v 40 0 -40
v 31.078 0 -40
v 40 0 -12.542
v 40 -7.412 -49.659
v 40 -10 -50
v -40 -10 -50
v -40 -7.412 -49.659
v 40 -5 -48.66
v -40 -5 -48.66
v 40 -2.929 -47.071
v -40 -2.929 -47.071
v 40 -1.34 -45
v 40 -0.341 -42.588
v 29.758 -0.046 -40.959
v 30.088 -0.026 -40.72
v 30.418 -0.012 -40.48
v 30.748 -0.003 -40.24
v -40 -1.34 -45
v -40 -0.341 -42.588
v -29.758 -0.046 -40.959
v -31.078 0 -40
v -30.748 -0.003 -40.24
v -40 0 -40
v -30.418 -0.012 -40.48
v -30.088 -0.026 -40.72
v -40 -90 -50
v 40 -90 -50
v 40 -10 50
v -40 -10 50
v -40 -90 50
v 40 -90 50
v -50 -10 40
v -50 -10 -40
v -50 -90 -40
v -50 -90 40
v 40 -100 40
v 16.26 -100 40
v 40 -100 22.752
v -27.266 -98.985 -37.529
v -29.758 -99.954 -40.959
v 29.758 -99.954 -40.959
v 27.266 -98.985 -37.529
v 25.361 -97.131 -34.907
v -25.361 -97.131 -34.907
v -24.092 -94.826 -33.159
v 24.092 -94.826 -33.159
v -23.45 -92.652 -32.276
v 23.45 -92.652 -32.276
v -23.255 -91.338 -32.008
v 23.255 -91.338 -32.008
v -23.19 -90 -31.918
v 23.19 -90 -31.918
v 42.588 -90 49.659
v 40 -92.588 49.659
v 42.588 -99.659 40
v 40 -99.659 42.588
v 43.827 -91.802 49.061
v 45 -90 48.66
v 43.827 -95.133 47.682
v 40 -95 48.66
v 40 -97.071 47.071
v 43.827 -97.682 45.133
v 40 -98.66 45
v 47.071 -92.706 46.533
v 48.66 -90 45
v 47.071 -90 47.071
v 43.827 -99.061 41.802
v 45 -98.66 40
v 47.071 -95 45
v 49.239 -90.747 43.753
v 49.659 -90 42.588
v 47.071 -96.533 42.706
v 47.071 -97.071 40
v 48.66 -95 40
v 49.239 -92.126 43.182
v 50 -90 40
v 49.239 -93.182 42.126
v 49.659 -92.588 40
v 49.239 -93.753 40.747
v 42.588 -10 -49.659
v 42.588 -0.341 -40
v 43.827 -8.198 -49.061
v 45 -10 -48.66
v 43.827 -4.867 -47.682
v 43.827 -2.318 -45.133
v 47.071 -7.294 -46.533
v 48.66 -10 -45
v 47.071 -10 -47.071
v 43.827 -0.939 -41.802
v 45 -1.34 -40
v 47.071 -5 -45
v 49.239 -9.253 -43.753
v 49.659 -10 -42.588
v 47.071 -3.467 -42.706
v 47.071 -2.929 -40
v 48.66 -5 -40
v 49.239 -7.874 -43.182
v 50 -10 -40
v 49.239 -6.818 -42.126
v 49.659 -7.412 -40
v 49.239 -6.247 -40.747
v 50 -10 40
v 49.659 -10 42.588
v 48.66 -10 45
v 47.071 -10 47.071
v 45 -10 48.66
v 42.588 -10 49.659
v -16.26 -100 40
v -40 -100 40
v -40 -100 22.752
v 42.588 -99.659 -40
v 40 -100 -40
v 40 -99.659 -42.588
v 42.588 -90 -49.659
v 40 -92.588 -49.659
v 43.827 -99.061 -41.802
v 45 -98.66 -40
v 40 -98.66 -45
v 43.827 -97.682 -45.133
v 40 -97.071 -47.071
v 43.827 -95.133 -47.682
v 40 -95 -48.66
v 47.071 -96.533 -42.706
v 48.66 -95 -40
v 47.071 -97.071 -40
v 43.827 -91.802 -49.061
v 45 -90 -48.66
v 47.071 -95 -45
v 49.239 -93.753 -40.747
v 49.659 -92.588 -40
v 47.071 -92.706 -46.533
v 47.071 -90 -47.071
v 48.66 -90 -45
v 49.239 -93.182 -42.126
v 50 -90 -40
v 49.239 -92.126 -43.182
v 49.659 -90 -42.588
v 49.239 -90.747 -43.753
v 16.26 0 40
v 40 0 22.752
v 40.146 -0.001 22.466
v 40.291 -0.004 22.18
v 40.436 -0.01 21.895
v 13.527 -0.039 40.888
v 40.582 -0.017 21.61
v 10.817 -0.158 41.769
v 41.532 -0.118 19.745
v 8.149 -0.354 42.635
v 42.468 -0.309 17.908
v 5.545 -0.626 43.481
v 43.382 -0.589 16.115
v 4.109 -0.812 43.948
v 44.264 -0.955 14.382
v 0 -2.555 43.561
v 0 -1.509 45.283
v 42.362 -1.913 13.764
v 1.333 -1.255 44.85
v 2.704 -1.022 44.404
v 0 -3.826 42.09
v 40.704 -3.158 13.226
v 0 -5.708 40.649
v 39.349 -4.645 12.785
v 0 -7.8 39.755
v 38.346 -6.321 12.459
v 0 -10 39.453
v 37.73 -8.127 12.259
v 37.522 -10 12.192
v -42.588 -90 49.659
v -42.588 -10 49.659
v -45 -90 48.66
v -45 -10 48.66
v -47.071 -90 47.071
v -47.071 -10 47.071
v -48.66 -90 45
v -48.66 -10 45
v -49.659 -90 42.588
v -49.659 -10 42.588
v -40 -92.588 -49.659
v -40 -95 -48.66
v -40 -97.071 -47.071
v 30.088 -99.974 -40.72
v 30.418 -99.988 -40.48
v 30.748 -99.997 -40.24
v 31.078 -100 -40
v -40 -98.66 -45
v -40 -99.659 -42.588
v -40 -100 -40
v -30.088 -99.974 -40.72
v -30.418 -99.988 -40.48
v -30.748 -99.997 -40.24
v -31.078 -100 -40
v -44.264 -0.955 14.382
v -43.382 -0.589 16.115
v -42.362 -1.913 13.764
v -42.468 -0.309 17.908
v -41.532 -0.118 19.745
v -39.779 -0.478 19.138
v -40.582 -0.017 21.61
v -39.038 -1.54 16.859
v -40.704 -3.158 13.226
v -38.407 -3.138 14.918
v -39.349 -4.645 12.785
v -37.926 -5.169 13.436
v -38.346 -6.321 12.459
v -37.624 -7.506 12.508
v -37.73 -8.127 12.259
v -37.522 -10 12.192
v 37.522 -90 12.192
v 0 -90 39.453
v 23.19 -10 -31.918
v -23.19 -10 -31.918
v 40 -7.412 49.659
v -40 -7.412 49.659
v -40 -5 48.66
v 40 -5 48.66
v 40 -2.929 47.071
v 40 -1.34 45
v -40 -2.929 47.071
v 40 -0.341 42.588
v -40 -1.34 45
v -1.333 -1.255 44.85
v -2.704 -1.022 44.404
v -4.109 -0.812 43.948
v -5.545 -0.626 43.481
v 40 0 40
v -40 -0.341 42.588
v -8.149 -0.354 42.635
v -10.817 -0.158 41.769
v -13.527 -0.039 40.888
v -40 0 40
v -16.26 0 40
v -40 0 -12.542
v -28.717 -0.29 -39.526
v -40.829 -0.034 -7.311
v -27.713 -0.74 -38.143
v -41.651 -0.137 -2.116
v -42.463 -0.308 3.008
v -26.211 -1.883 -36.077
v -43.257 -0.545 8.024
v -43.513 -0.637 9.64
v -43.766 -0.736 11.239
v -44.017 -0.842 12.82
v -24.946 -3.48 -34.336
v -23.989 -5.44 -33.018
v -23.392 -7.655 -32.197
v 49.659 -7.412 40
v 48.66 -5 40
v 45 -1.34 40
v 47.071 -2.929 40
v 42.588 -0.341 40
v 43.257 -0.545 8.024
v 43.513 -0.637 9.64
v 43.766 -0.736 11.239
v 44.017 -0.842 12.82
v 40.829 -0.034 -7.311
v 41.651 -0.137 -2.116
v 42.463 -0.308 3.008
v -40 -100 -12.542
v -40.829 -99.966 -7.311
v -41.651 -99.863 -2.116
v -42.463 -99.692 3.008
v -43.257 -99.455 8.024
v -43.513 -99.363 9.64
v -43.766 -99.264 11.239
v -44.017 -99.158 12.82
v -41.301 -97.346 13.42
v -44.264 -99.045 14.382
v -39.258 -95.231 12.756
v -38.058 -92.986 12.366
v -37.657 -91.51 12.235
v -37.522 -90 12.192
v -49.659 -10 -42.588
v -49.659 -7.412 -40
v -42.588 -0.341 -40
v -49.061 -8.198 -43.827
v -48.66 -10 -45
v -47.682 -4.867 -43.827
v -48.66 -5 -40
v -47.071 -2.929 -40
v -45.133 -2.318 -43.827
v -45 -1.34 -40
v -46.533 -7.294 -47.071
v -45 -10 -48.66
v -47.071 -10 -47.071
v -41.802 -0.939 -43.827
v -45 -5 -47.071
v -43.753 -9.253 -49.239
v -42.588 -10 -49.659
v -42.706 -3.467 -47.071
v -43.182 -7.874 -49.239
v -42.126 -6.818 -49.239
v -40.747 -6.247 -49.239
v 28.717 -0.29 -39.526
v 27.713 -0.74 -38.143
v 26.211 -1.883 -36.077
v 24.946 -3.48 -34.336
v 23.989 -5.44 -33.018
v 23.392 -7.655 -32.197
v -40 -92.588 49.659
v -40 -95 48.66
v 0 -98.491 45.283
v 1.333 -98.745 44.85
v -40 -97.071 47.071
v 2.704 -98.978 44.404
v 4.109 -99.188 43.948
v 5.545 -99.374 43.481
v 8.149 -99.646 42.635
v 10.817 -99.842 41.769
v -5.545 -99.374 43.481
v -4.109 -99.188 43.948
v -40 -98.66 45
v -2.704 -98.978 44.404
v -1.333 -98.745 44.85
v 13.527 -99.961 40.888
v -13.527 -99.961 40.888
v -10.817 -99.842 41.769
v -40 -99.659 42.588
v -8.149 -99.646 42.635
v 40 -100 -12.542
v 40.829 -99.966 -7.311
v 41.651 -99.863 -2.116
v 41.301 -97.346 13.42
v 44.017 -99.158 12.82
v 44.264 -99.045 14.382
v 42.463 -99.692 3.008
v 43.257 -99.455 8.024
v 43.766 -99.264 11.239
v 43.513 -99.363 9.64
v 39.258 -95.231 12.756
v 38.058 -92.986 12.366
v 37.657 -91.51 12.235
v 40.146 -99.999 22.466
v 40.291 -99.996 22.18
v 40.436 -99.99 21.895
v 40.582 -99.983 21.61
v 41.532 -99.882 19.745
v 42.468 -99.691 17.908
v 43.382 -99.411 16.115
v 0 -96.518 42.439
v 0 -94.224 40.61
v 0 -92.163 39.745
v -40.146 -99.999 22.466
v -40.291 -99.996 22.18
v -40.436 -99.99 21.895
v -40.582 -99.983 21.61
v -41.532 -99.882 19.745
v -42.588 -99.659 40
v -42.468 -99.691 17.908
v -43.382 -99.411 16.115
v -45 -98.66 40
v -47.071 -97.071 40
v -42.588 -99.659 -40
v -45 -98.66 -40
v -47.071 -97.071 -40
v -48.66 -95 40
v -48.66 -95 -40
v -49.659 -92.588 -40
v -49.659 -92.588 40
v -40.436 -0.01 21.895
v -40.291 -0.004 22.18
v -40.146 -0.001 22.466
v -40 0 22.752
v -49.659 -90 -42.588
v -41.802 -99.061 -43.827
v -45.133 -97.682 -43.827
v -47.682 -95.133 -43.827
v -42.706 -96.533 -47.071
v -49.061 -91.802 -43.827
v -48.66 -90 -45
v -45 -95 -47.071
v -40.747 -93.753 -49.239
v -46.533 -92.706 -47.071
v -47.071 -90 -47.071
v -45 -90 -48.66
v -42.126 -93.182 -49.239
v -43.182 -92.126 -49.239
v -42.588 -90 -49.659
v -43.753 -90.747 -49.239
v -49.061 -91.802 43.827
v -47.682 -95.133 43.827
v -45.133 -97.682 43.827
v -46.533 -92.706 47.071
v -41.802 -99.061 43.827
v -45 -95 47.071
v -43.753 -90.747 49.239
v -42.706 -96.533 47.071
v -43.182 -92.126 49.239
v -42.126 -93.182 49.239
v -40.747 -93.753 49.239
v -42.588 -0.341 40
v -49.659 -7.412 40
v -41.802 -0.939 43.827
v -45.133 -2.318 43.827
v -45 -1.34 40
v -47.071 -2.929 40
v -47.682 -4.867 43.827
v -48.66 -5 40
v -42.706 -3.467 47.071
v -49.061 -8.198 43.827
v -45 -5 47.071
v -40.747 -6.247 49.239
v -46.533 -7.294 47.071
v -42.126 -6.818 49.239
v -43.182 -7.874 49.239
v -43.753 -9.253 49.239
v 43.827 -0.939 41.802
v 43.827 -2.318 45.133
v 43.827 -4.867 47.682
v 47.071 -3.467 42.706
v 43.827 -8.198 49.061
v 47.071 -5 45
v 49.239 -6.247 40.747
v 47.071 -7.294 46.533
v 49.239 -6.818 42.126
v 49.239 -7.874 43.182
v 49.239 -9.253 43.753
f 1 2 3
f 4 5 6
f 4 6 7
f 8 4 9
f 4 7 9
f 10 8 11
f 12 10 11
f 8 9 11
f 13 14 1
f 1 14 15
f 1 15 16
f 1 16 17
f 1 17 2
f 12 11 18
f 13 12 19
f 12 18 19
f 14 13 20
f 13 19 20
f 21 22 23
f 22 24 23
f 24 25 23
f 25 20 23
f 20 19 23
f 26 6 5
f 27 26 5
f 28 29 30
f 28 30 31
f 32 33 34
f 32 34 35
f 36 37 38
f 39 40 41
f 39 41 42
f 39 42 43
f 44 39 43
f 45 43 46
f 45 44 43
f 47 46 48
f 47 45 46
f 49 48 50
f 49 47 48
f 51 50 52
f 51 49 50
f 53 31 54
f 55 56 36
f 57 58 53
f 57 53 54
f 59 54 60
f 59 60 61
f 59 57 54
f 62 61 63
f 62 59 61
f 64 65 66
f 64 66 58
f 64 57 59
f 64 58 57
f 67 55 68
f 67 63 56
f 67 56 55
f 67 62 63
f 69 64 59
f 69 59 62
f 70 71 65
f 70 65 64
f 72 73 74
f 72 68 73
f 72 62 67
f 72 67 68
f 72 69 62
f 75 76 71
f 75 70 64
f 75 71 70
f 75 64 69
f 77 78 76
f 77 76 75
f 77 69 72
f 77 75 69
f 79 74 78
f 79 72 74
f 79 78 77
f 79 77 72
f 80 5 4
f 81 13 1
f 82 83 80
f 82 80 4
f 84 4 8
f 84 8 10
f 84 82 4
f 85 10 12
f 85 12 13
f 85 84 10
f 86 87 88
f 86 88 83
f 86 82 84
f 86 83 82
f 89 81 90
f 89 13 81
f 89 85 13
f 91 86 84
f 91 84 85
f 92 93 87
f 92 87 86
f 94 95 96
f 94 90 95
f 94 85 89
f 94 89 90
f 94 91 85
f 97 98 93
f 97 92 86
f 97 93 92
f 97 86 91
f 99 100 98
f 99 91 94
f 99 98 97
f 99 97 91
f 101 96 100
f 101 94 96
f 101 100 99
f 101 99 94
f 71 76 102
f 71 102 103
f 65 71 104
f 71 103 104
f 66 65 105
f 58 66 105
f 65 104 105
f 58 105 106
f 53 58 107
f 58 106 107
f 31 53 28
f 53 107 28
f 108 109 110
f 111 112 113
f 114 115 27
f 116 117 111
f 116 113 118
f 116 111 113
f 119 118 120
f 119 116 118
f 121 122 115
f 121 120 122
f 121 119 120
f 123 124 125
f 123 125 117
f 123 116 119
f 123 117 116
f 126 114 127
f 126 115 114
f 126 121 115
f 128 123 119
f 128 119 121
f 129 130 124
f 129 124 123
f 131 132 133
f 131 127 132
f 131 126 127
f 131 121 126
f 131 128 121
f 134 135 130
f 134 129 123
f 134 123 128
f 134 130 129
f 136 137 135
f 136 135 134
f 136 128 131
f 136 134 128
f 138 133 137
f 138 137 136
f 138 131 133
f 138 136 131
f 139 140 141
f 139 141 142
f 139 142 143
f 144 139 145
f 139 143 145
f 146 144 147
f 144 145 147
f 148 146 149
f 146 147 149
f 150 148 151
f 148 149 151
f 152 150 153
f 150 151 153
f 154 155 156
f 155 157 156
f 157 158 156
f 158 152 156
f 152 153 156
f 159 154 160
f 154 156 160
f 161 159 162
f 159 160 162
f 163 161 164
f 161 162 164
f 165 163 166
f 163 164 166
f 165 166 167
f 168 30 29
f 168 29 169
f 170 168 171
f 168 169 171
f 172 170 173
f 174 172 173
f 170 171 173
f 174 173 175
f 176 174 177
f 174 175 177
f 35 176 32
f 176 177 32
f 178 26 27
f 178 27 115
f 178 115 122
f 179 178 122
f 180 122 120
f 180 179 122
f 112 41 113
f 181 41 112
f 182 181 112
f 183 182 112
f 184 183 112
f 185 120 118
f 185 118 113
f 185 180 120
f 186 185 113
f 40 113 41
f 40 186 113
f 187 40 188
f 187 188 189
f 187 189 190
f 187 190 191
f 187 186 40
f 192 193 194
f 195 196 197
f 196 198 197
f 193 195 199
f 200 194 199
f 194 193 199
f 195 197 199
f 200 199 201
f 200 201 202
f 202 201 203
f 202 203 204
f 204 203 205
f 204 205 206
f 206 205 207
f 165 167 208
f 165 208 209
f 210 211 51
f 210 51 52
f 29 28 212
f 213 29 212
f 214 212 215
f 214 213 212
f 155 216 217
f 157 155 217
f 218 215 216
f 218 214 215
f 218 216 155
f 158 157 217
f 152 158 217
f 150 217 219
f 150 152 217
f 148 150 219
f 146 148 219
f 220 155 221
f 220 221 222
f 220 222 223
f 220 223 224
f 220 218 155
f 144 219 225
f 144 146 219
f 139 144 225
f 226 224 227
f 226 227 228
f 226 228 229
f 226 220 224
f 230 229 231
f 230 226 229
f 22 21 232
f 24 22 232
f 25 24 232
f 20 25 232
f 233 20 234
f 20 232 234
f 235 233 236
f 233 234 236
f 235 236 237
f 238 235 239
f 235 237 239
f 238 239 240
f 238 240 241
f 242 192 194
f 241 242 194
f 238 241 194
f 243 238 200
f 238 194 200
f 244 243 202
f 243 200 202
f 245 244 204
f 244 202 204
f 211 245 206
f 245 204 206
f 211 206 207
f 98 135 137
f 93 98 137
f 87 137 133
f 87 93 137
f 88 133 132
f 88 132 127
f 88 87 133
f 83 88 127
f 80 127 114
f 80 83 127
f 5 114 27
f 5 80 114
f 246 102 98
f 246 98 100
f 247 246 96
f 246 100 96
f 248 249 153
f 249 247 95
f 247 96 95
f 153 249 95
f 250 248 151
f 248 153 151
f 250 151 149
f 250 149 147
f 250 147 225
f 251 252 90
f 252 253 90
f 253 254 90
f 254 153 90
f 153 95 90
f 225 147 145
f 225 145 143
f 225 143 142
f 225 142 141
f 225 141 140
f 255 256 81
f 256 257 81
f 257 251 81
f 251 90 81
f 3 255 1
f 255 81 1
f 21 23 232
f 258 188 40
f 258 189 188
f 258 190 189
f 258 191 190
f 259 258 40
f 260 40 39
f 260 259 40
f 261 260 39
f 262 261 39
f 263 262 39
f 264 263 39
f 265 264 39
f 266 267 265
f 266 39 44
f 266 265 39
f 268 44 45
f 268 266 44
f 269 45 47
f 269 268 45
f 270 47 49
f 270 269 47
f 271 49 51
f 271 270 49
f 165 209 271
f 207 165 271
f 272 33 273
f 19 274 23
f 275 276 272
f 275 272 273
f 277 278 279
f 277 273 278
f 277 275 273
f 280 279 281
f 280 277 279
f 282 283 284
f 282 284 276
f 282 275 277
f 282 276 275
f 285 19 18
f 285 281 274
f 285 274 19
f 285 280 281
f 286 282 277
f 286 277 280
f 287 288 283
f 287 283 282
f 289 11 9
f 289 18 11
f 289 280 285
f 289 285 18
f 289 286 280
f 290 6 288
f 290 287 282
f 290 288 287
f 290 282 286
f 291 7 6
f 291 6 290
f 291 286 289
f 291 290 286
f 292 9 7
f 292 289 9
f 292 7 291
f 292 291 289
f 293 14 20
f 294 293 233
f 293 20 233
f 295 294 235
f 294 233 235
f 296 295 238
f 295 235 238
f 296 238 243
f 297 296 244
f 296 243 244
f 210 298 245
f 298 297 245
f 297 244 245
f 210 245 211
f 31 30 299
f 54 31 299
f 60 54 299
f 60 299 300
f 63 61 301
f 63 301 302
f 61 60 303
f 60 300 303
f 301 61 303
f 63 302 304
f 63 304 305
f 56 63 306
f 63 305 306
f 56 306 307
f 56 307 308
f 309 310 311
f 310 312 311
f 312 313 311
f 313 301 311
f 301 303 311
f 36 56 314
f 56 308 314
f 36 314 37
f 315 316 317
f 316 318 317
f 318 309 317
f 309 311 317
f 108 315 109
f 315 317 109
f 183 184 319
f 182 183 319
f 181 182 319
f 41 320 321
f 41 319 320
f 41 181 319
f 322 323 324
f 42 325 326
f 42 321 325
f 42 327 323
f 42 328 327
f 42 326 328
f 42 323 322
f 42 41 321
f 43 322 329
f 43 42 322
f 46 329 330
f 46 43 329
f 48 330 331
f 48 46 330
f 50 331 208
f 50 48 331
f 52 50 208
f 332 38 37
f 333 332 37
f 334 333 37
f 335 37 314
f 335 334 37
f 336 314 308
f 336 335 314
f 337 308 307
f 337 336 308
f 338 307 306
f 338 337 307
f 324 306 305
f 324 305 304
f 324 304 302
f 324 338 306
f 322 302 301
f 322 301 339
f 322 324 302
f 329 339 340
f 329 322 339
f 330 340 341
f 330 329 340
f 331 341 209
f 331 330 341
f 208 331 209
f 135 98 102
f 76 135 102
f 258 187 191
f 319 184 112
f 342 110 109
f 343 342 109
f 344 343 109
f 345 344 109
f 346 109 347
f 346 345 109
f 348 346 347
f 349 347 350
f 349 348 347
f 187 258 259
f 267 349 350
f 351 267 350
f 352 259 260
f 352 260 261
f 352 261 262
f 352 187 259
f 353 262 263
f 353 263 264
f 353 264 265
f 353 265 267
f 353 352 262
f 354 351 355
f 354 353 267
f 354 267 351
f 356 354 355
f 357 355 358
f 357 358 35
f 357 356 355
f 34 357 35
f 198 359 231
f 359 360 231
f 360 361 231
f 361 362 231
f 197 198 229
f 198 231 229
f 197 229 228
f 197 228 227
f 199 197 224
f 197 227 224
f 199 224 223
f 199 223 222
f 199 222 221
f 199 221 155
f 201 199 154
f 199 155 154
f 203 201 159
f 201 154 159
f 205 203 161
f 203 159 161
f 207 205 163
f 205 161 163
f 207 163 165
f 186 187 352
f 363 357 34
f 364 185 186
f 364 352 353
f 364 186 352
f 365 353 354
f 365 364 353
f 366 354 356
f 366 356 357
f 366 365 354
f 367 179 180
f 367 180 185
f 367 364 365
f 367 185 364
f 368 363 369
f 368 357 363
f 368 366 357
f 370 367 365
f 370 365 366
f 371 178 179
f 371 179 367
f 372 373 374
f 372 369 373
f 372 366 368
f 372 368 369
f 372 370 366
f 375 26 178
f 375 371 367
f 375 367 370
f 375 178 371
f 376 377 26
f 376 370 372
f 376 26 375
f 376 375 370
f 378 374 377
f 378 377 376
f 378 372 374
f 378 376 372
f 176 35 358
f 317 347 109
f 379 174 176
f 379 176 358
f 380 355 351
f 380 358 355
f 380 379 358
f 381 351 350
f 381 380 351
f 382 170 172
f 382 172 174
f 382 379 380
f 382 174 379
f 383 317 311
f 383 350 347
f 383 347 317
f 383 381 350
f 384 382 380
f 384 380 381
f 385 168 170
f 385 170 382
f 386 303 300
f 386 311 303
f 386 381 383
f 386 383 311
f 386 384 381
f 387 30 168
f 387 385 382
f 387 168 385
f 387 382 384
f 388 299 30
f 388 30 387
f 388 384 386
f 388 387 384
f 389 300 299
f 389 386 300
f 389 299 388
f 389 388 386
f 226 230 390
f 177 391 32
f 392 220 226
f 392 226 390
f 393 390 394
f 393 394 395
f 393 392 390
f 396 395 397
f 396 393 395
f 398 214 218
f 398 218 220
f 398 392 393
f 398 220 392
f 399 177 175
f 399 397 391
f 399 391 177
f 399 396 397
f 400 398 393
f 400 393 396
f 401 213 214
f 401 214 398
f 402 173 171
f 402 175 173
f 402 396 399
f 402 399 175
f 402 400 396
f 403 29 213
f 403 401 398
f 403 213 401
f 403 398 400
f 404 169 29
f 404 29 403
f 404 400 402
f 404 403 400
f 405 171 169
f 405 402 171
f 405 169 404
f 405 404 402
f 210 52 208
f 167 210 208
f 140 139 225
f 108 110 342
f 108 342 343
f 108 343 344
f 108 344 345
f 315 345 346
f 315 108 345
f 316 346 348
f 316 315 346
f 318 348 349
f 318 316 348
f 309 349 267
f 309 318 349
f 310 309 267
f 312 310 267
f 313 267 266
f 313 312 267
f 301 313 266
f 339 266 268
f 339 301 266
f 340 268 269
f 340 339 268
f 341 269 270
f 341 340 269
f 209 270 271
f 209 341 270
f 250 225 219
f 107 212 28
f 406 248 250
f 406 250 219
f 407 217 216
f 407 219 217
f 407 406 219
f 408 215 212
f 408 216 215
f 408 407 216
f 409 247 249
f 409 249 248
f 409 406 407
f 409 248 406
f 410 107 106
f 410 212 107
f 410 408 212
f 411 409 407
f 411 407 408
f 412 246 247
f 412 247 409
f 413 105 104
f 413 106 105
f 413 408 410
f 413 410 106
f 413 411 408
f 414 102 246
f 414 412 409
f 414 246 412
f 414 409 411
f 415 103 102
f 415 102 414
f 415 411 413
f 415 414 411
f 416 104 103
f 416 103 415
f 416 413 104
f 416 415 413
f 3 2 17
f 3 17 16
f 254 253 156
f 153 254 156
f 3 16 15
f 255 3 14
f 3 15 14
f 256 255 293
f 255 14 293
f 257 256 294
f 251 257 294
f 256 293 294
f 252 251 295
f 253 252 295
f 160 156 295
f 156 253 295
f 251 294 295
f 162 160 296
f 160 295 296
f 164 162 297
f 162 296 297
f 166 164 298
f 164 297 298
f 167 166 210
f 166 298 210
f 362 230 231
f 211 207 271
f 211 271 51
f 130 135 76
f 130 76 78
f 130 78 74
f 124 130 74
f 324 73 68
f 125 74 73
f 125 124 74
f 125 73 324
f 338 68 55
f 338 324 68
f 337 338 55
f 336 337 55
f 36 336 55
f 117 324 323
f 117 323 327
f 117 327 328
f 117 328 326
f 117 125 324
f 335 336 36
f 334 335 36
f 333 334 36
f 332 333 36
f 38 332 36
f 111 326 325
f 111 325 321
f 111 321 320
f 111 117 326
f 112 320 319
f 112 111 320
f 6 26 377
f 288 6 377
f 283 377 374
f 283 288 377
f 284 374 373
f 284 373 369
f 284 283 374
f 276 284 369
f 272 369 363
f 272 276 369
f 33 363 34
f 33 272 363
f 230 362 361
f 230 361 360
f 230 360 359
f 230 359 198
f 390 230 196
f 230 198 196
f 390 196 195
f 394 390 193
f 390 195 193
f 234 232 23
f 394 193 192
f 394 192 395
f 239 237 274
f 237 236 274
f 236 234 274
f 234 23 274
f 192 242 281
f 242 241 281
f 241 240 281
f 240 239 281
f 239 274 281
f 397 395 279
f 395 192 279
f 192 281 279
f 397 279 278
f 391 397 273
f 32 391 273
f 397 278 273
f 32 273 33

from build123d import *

# Parameters (mm, degrees)
F0_W          = 100
F0_H          = 100
F1_DEPTH      = 100
F3_DEPTH      = 134.3
F4_T1_DEPTH   = 80
F4_T3_DEPTH   = 80
F4_T5_DEPTH   = 80
F4_S9_W       = 10
F4_S9_H       = 10
F4_T10_DEPTH  = 10
F4_S15_W      = 10
F4_S15_H      = 10
F4_T16_DEPTH  = 10
F4_S21_W      = 10
F4_S21_H      = 10
F4_T22_DEPTH  = 10
F4_S27_W      = 10
F4_S27_H      = 10
F4_T28_DEPTH  = 10
F4_S33_W      = 10
F4_S33_H      = 10
F4_T34_DEPTH  = 10
F4_S39_W      = 10
F4_S39_H      = 10
F4_T40_DEPTH  = 10
F4_S45_W      = 10
F4_S45_H      = 10
F4_T46_DEPTH  = 10
F4_S51_W      = 10
F4_S51_H      = 10
F4_T52_DEPTH  = 10
F4_T58_DEPTH  = 96.3793887771
F4_T64_DEPTH  = 96.3793887771
F4_T70_DEPTH  = 96.3793887771
F4_T76_DEPTH  = 96.3793887771
F4_T82_DEPTH  = 96.3793887771
F4_T88_DEPTH  = 96.3793887771
F4_T94_DEPTH  = 96.3793887771
F4_T100_DEPTH = 96.3793887771
F4_T106_DEPTH = 96.3793887771
F4_T112_DEPTH = 96.3793887771
F4_T119_DEPTH = 96.3793887771
F4_T123_DEPTH = 96.3793887771
F4_T130_DEPTH = 96.3793887771
F4_T134_DEPTH = 96.3793887771
F4_T141_DEPTH = 96.3793887771
F4_T145_DEPTH = 96.3793887771
F4_T152_DEPTH = 96.3793887771
F4_T156_DEPTH = 96.3793887771
F4_T163_DEPTH = 96.3793887771
F4_T167_DEPTH = 96.3793887771
F4_T174_DEPTH = 96.3793887771
F4_T178_DEPTH = 96.3793887771
F4_T185_DEPTH = 96.3793887771
F4_T189_DEPTH = 96.3793887771
F4_T196_DEPTH = 96.3793887771
F4_T200_DEPTH = 96.3793887771
F4_T207_DEPTH = 96.3793887771
F4_T211_DEPTH = 96.3793887771
F4_T218_DEPTH = 96.3793887771
F4_T222_DEPTH = 96.3793887771


# Not quite as in the source:
# - a fillet or chamfer that OpenCascade refuses, or shapes differently, is made with other operations: its cross-section is extruded or revolved along the edge and cut away or added


with BuildPart() as f1:
    # F0 (on Front) → F1 (new body)
    with BuildSketch(Plane.XZ):
        Rectangle(F0_W, F0_H)
    extrude(amount=F1_DEPTH)

    # F2 (on face) → F3 (cut)
    with BuildSketch(Plane.XZ.offset(100)):
        Polygon((37.5217137094, 12.1915438206), (0, 39.4526645541), (-37.5217137094, 12.1915438206), (-23.1896943886, -31.9178760977), (23.1896943886, -31.9178760977), align=None)
    extrude(amount=-F3_DEPTH, mode=Mode.SUBTRACT)

    # F4: fillet of radius 10 on 22 edges, made by hand

    # F4_s2 → F4_t1 (cut)
    with BuildSketch(Plane.XZ.offset(10)):
        with BuildLine():
            ThreePointArc((50, -40), (47.0710678119, -47.0710678119), (40, -50))
            Line((40, -50), (50, -50))
            Line((50, -50), (50, -40))
        make_face()
        with BuildLine():
            ThreePointArc((50, 40), (47.0710678119, 47.0710678119), (40, 50))
            Line((40, 50), (50, 50))
            Line((50, 50), (50, 40))
        make_face()
        with BuildLine():
            ThreePointArc((-40, 50), (-47.0710678119, 47.0710678119), (-50, 40))
            Line((-50, 40), (-50, 50))
            Line((-50, 50), (-40, 50))
        make_face()
        with BuildLine():
            ThreePointArc((-40, -50), (-47.0710678119, -47.0710678119), (-50, -40))
            Line((-50, -40), (-50, -50))
            Line((-50, -50), (-40, -50))
        make_face()
    extrude(amount=F4_T1_DEPTH, mode=Mode.SUBTRACT)

    # F4_s4 → F4_t3 (cut)
    with BuildSketch(Plane.XY.offset(-40)):
        with BuildLine():
            ThreePointArc((50, -10), (47.0710678119, -2.9289321881), (40, 0))
            Line((40, 0), (50, 0))
            Line((50, 0), (50, -10))
        make_face()
        with BuildLine():
            ThreePointArc((50, -90), (47.0710678119, -97.0710678119), (40, -100))
            Line((40, -100), (50, -100))
            Line((50, -100), (50, -90))
        make_face()
        with BuildLine():
            ThreePointArc((-40, 0), (-47.0710678119, -2.9289321881), (-50, -10))
            Line((-50, -10), (-50, 0))
            Line((-50, 0), (-40, 0))
        make_face()
        with BuildLine():
            ThreePointArc((-40, -100), (-47.0710678119, -97.0710678119), (-50, -90))
            Line((-50, -90), (-50, -100))
            Line((-50, -100), (-40, -100))
        make_face()
    extrude(amount=F4_T3_DEPTH, mode=Mode.SUBTRACT)

    # F4_s6 → F4_t5 (cut)
    with BuildSketch(Plane.YZ.offset(-40)):
        with BuildLine():
            ThreePointArc((-10, 50), (-2.9289321881, 47.0710678119), (0, 40))
            Line((0, 40), (0, 50))
            Line((0, 50), (-10, 50))
        make_face()
        with BuildLine():
            ThreePointArc((-90, 50), (-97.0710678119, 47.0710678119), (-100, 40))
            Line((-100, 40), (-100, 50))
            Line((-100, 50), (-90, 50))
        make_face()
        with BuildLine():
            ThreePointArc((-10, -50), (-2.9289321881, -47.0710678119), (0, -40))
            Line((0, -40), (0, -50))
            Line((0, -50), (-10, -50))
        make_face()
        with BuildLine():
            ThreePointArc((-90, -50), (-97.0710678119, -47.0710678119), (-100, -40))
            Line((-100, -40), (-100, -50))
            Line((-100, -50), (-90, -50))
        make_face()
    extrude(amount=F4_T5_DEPTH, mode=Mode.SUBTRACT)


with BuildPart() as f4_tool8:
    # F4_s9 → F4_t10 (new body)
    with BuildSketch(Plane.YZ.offset(40)):
        with Locations((-5, -45)):
            Rectangle(F4_S9_W, F4_S9_H)
    extrude(amount=F4_T10_DEPTH)

    # F4_s11 → F4_t12 (revolve, cut)
    with BuildSketch(Plane(origin=(40, -10, -40), x_dir=(0, -0.7071067812, 0.7071067812), z_dir=(0, 0.7071067812, 0.7071067812))):
        with BuildLine():
            ThreePointArc((0, -10), (10, 0), (0, 10))
            Line((0, 10), (0, -10))
        make_face()
    revolve(axis=Axis((40, -10, -40), (1, 0, 0)), mode=Mode.SUBTRACT)


with BuildPart() as f1_1:
    add(f1.part)

    # F4_t7: cut F4_tool8
    add(f4_tool8.part, mode=Mode.SUBTRACT)


with BuildPart() as f4_tool14:
    # F4_s15 → F4_t16 (new body)
    with BuildSketch(Plane.YZ.offset(40)):
        with Locations((-95, -45)):
            Rectangle(F4_S15_W, F4_S15_H)
    extrude(amount=F4_T16_DEPTH)

    # F4_s17 → F4_t18 (revolve, cut)
    with BuildSketch(Plane(origin=(40, -90, -40), x_dir=(0, 0.7071067812, 0.7071067812), z_dir=(0, 0.7071067812, -0.7071067812))):
        with BuildLine():
            ThreePointArc((0, -10), (10, 0), (0, 10))
            Line((0, 10), (0, -10))
        make_face()
    revolve(axis=Axis((40, -90, -40), (1, 0, 0)), mode=Mode.SUBTRACT)


with BuildPart() as f1_2:
    add(f1_1.part)

    # F4_t13: cut F4_tool14
    add(f4_tool14.part, mode=Mode.SUBTRACT)


with BuildPart() as f4_tool20:
    # F4_s21 → F4_t22 (new body)
    with BuildSketch(Plane.YZ.offset(40)):
        with Locations((-5, 45)):
            Rectangle(F4_S21_W, F4_S21_H)
    extrude(amount=F4_T22_DEPTH)

    # F4_s23 → F4_t24 (revolve, cut)
    with BuildSketch(Plane(origin=(40, -10, 40), x_dir=(0, -0.7071067812, -0.7071067812), z_dir=(0, -0.7071067812, 0.7071067812))):
        with BuildLine():
            ThreePointArc((0, -10), (10, 0), (0, 10))
            Line((0, 10), (0, -10))
        make_face()
    revolve(axis=Axis((40, -10, 40), (1, 0, 0)), mode=Mode.SUBTRACT)


with BuildPart() as f1_3:
    add(f1_2.part)

    # F4_t19: cut F4_tool20
    add(f4_tool20.part, mode=Mode.SUBTRACT)


with BuildPart() as f4_tool26:
    # F4_s27 → F4_t28 (new body)
    with BuildSketch(Plane.YZ.offset(40)):
        with Locations((-95, 45)):
            Rectangle(F4_S27_W, F4_S27_H)
    extrude(amount=F4_T28_DEPTH)

    # F4_s29 → F4_t30 (revolve, cut)
    with BuildSketch(Plane(origin=(40, -90, 40), x_dir=(0, 0.7071067812, -0.7071067812), z_dir=(0, -0.7071067812, -0.7071067812))):
        with BuildLine():
            ThreePointArc((0, -10), (10, 0), (0, 10))
            Line((0, 10), (0, -10))
        make_face()
    revolve(axis=Axis((40, -90, 40), (1, 0, 0)), mode=Mode.SUBTRACT)


with BuildPart() as f1_4:
    add(f1_3.part)

    # F4_t25: cut F4_tool26
    add(f4_tool26.part, mode=Mode.SUBTRACT)


with BuildPart() as f4_tool32:
    # F4_s33 → F4_t34 (new body)
    with BuildSketch(Plane.XY.offset(40)):
        with Locations((-45, -5)):
            Rectangle(F4_S33_W, F4_S33_H)
    extrude(amount=F4_T34_DEPTH)

    # F4_s35 → F4_t36 (revolve, cut)
    with BuildSketch(Plane(origin=(-40, -10, 40), x_dir=(0.7071067812, -0.7071067812, 0), z_dir=(-0.7071067812, -0.7071067812, 0))):
        with BuildLine():
            ThreePointArc((0, -10), (10, 0), (0, 10))
            Line((0, 10), (0, -10))
        make_face()
    revolve(axis=Axis((-40, -10, 40), (0, 0, 1)), mode=Mode.SUBTRACT)


with BuildPart() as f1_5:
    add(f1_4.part)

    # F4_t31: cut F4_tool32
    add(f4_tool32.part, mode=Mode.SUBTRACT)


with BuildPart() as f4_tool38:
    # F4_s39 → F4_t40 (new body)
    with BuildSketch(Plane.XY.offset(40)):
        with Locations((-45, -95)):
            Rectangle(F4_S39_W, F4_S39_H)
    extrude(amount=F4_T40_DEPTH)

    # F4_s41 → F4_t42 (revolve, cut)
    with BuildSketch(Plane(origin=(-40, -90, 40), x_dir=(0.7071067812, 0.7071067812, 0), z_dir=(0.7071067812, -0.7071067812, 0))):
        with BuildLine():
            ThreePointArc((0, -10), (10, 0), (0, 10))
            Line((0, 10), (0, -10))
        make_face()
    revolve(axis=Axis((-40, -90, 40), (0, 0, 1)), mode=Mode.SUBTRACT)


with BuildPart() as f1_6:
    add(f1_5.part)

    # F4_t37: cut F4_tool38
    add(f4_tool38.part, mode=Mode.SUBTRACT)


with BuildPart() as f4_tool44:
    # F4_s45 → F4_t46 (new body)
    with BuildSketch(Plane.XY.offset(-40)):
        with Locations((-45, -5)):
            Rectangle(F4_S45_W, F4_S45_H)
    extrude(amount=-F4_T46_DEPTH)

    # F4_s47 → F4_t48 (revolve, cut)
    with BuildSketch(Plane(origin=(-40, -10, -40), x_dir=(0.7071067812, -0.7071067812, 0), z_dir=(0.7071067812, 0.7071067812, 0))):
        with BuildLine():
            ThreePointArc((0, -10), (10, 0), (0, 10))
            Line((0, 10), (0, -10))
        make_face()
    revolve(axis=Axis((-40, -10, -40), (0, 0, -1)), mode=Mode.SUBTRACT)


with BuildPart() as f1_7:
    add(f1_6.part)

    # F4_t43: cut F4_tool44
    add(f4_tool44.part, mode=Mode.SUBTRACT)


with BuildPart() as f4_tool50:
    # F4_s51 → F4_t52 (new body)
    with BuildSketch(Plane.XY.offset(-40)):
        with Locations((-45, -95)):
            Rectangle(F4_S51_W, F4_S51_H)
    extrude(amount=-F4_T52_DEPTH)

    # F4_s53 → F4_t54 (revolve, cut)
    with BuildSketch(Plane(origin=(-40, -90, -40), x_dir=(0.7071067812, 0.7071067812, 0), z_dir=(-0.7071067812, 0.7071067812, 0))):
        with BuildLine():
            ThreePointArc((0, -10), (10, 0), (0, 10))
            Line((0, 10), (0, -10))
        make_face()
    revolve(axis=Axis((-40, -90, -40), (0, 0, -1)), mode=Mode.SUBTRACT)


with BuildPart() as f1_8:
    add(f1_7.part)

    # F4_t49: cut F4_tool50
    add(f4_tool50.part, mode=Mode.SUBTRACT)


with BuildPart() as f4_tool56:
    # F4_s57 → F4_t58 (new body)
    with BuildSketch(Plane(origin=(38.9862817141, 0, -28.3251916741), x_dir=(0, 1, 0), z_dir=(-0.8090169944, 0, 0.5877852523))):
        with BuildLine():
            ThreePointArc((0, -41.9178760977), (-2.9289321881, -34.8468082858), (-10, -31.9178760977))
            Line((-10, -31.9178760977), (0, -31.9178760977))
            Line((0, -31.9178760977), (0, -41.9178760977))
        make_face()
    extrude(amount=F4_T58_DEPTH)

    split(bisect_by=Plane(origin=(-18.7608568547, 0, 25.8221041874), x_dir=(0, 1, 0), z_dir=(0.5877852523, 0, -0.8090169944)), keep=Keep.TOP)

    split(bisect_by=Plane(origin=(30.355704049, 0, -9.8631661385), x_dir=(0, 1, 0), z_dir=(-0.9510565163, 0, 0.3090169944)), keep=Keep.TOP)


with BuildPart() as f1_9:
    add(f1_8.part)

    # F4_t55: cut F4_tool56
    add(f4_tool56.part, mode=Mode.SUBTRACT)


with BuildPart() as f4_tool62:
    # F4_s63 → F4_t64 (new body)
    with BuildSketch(Plane(origin=(38.9862817141, 0, 28.3251916741), x_dir=(0, 1, 0), z_dir=(-0.8090169944, 0, -0.5877852523))):
        with BuildLine():
            ThreePointArc((0, -41.9178760977), (-2.9289321881, -34.8468082858), (-10, -31.9178760977))
            Line((-10, -31.9178760977), (0, -31.9178760977))
            Line((0, -31.9178760977), (0, -41.9178760977))
        make_face()
    extrude(amount=F4_T64_DEPTH)

    split(bisect_by=Plane(origin=(18.7608568547, 0, 25.8221041874), x_dir=(0, 1, 0), z_dir=(-0.5877852523, 0, -0.8090169944)), keep=Keep.TOP)

    split(bisect_by=Plane(origin=(-30.355704049, 0, -9.8631661385), x_dir=(0, 1, 0), z_dir=(0.9510565163, 0, 0.3090169944)), keep=Keep.TOP)


with BuildPart() as f1_10:
    add(f1_9.part)

    # F4_t61: cut F4_tool62
    add(f4_tool62.part, mode=Mode.SUBTRACT)


with BuildPart() as f4_tool68:
    # F4_s69 → F4_t70 (new body)
    with BuildSketch(Plane(origin=(-14.8914345198, 0, 45.8311228665), x_dir=(0, 1, 0), z_dir=(0.3090169944, 0, -0.9510565163))):
        with BuildLine():
            ThreePointArc((0, -41.9178760977), (-2.9289321881, -34.8468082858), (-10, -31.9178760977))
            Line((-10, -31.9178760977), (0, -31.9178760977))
            Line((0, -31.9178760977), (0, -41.9178760977))
        make_face()
    extrude(amount=F4_T70_DEPTH)

    split(bisect_by=Plane(origin=(-18.7608568547, 0, 25.8221041874), x_dir=(0, 1, 0), z_dir=(0.5877852523, 0, -0.8090169944)), keep=Keep.TOP)

    split(bisect_by=Plane.XY.offset(-31.9178760977), keep=Keep.TOP)


with BuildPart() as f1_11:
    add(f1_10.part)

    # F4_t67: cut F4_tool68
    add(f4_tool68.part, mode=Mode.SUBTRACT)


with BuildPart() as f4_tool74:
    # F4_s75 → F4_t76 (new body)
    with BuildSketch(Plane.YZ.offset(-48.1896943886)):
        with BuildLine():
            ThreePointArc((0, -41.9178760977), (-2.9289321881, -34.8468082858), (-10, -31.9178760977))
            Line((-10, -31.9178760977), (0, -31.9178760977))
            Line((0, -31.9178760977), (0, -41.9178760977))
        make_face()
    extrude(amount=F4_T76_DEPTH)

    split(bisect_by=Plane(origin=(-30.355704049, 0, -9.8631661385), x_dir=(0, 1, 0), z_dir=(0.9510565163, 0, 0.3090169944)), keep=Keep.TOP)

    split(bisect_by=Plane(origin=(30.355704049, 0, -9.8631661385), x_dir=(0, 1, 0), z_dir=(-0.9510565163, 0, 0.3090169944)), keep=Keep.TOP)


with BuildPart() as f1_12:
    add(f1_11.part)

    # F4_t73: cut F4_tool74
    add(f4_tool74.part, mode=Mode.SUBTRACT)


with BuildPart() as f4_tool80:
    # F4_s81 → F4_t82 (new body)
    with BuildSketch(Plane(origin=(-14.8914345198, 0, -45.8311228665), x_dir=(0, 1, 0), z_dir=(0.3090169944, 0, 0.9510565163))):
        with BuildLine():
            ThreePointArc((0, -41.9178760977), (-2.9289321881, -34.8468082858), (-10, -31.9178760977))
            Line((-10, -31.9178760977), (0, -31.9178760977))
            Line((0, -31.9178760977), (0, -41.9178760977))
        make_face()
    extrude(amount=F4_T82_DEPTH)

    split(bisect_by=Plane(origin=(18.7608568547, 0, 25.8221041874), x_dir=(0, 1, 0), z_dir=(-0.5877852523, 0, -0.8090169944)), keep=Keep.TOP)

    split(bisect_by=Plane.XY.offset(-31.9178760977), keep=Keep.TOP)


with BuildPart() as f1_13:
    add(f1_12.part)

    # F4_t79: cut F4_tool80
    add(f4_tool80.part, mode=Mode.SUBTRACT)


with BuildPart() as f4_tool86:
    # F4_s87 → F4_t88 (new body)
    with BuildSketch(Plane(origin=(38.9862817141, 0, -28.3251916741), x_dir=(0, 1, 0), z_dir=(-0.8090169944, 0, 0.5877852523))):
        with BuildLine():
            ThreePointArc((-100, -41.9178760977), (-97.0710678119, -34.8468082858), (-90, -31.9178760977))
            Line((-90, -31.9178760977), (-100, -31.9178760977))
            Line((-100, -31.9178760977), (-100, -41.9178760977))
        make_face()
    extrude(amount=F4_T88_DEPTH)

    split(bisect_by=Plane(origin=(-18.7608568547, 0, 25.8221041874), x_dir=(0, 1, 0), z_dir=(0.5877852523, 0, -0.8090169944)), keep=Keep.TOP)

    split(bisect_by=Plane(origin=(30.355704049, 0, -9.8631661385), x_dir=(0, 1, 0), z_dir=(-0.9510565163, 0, 0.3090169944)), keep=Keep.TOP)


with BuildPart() as f1_14:
    add(f1_13.part)

    # F4_t85: cut F4_tool86
    add(f4_tool86.part, mode=Mode.SUBTRACT)


with BuildPart() as f4_tool92:
    # F4_s93 → F4_t94 (new body)
    with BuildSketch(Plane(origin=(38.9862817141, 0, 28.3251916741), x_dir=(0, 1, 0), z_dir=(-0.8090169944, 0, -0.5877852523))):
        with BuildLine():
            ThreePointArc((-100, -41.9178760977), (-97.0710678119, -34.8468082858), (-90, -31.9178760977))
            Line((-90, -31.9178760977), (-100, -31.9178760977))
            Line((-100, -31.9178760977), (-100, -41.9178760977))
        make_face()
    extrude(amount=F4_T94_DEPTH)

    split(bisect_by=Plane(origin=(18.7608568547, 0, 25.8221041874), x_dir=(0, 1, 0), z_dir=(-0.5877852523, 0, -0.8090169944)), keep=Keep.TOP)

    split(bisect_by=Plane(origin=(-30.355704049, 0, -9.8631661385), x_dir=(0, 1, 0), z_dir=(0.9510565163, 0, 0.3090169944)), keep=Keep.TOP)


with BuildPart() as f1_15:
    add(f1_14.part)

    # F4_t91: cut F4_tool92
    add(f4_tool92.part, mode=Mode.SUBTRACT)


with BuildPart() as f4_tool98:
    # F4_s99 → F4_t100 (new body)
    with BuildSketch(Plane(origin=(-14.8914345198, 0, 45.8311228665), x_dir=(0, 1, 0), z_dir=(0.3090169944, 0, -0.9510565163))):
        with BuildLine():
            ThreePointArc((-100, -41.9178760977), (-97.0710678119, -34.8468082858), (-90, -31.9178760977))
            Line((-90, -31.9178760977), (-100, -31.9178760977))
            Line((-100, -31.9178760977), (-100, -41.9178760977))
        make_face()
    extrude(amount=F4_T100_DEPTH)

    split(bisect_by=Plane(origin=(-18.7608568547, 0, 25.8221041874), x_dir=(0, 1, 0), z_dir=(0.5877852523, 0, -0.8090169944)), keep=Keep.TOP)

    split(bisect_by=Plane.XY.offset(-31.9178760977), keep=Keep.TOP)


with BuildPart() as f1_16:
    add(f1_15.part)

    # F4_t97: cut F4_tool98
    add(f4_tool98.part, mode=Mode.SUBTRACT)


with BuildPart() as f4_tool104:
    # F4_s105 → F4_t106 (new body)
    with BuildSketch(Plane.YZ.offset(-48.1896943886)):
        with BuildLine():
            ThreePointArc((-100, -41.9178760977), (-97.0710678119, -34.8468082858), (-90, -31.9178760977))
            Line((-90, -31.9178760977), (-100, -31.9178760977))
            Line((-100, -31.9178760977), (-100, -41.9178760977))
        make_face()
    extrude(amount=F4_T106_DEPTH)

    split(bisect_by=Plane(origin=(-30.355704049, 0, -9.8631661385), x_dir=(0, 1, 0), z_dir=(0.9510565163, 0, 0.3090169944)), keep=Keep.TOP)

    split(bisect_by=Plane(origin=(30.355704049, 0, -9.8631661385), x_dir=(0, 1, 0), z_dir=(-0.9510565163, 0, 0.3090169944)), keep=Keep.TOP)


with BuildPart() as f1_17:
    add(f1_16.part)

    # F4_t103: cut F4_tool104
    add(f4_tool104.part, mode=Mode.SUBTRACT)


with BuildPart() as f4_tool110:
    # F4_s111 → F4_t112 (new body)
    with BuildSketch(Plane(origin=(-14.8914345198, 0, -45.8311228665), x_dir=(0, 1, 0), z_dir=(0.3090169944, 0, 0.9510565163))):
        with BuildLine():
            ThreePointArc((-100, -41.9178760977), (-97.0710678119, -34.8468082858), (-90, -31.9178760977))
            Line((-90, -31.9178760977), (-100, -31.9178760977))
            Line((-100, -31.9178760977), (-100, -41.9178760977))
        make_face()
    extrude(amount=F4_T112_DEPTH)

    split(bisect_by=Plane(origin=(18.7608568547, 0, 25.8221041874), x_dir=(0, 1, 0), z_dir=(-0.5877852523, 0, -0.8090169944)), keep=Keep.TOP)

    split(bisect_by=Plane.XY.offset(-31.9178760977), keep=Keep.TOP)


with BuildPart() as f1_18:
    add(f1_17.part)

    # F4_t109: cut F4_tool110
    add(f4_tool110.part, mode=Mode.SUBTRACT)


with BuildPart() as f4_tool117:
    # F4_s118 → F4_t119 (new body)
    with BuildSketch(Plane(origin=(38.9862817141, 0, -28.3251916741), x_dir=(0, 1, 0), z_dir=(-0.8090169944, 0, 0.5877852523))):
        with BuildLine():
            ThreePointArc((0, -41.9178760977), (-2.9289321881, -34.8468082858), (-10, -31.9178760977))
            Line((-10, -31.9178760977), (0, -31.9178760977))
            Line((0, -31.9178760977), (0, -41.9178760977))
        make_face()
    extrude(amount=F4_T119_DEPTH)

    split(bisect_by=Plane(origin=(30.355704049, 0, -9.8631661385), x_dir=(0, 1, 0), z_dir=(0.9510565163, 0, -0.3090169944)), keep=Keep.TOP)


with BuildPart() as f4_tool121:
    # F4_s122 → F4_t123 (new body)
    with BuildSketch(Plane(origin=(-14.8914345198, 0, -45.8311228665), x_dir=(0, 1, 0), z_dir=(0.3090169944, 0, 0.9510565163))):
        with BuildLine():
            ThreePointArc((0, -41.9178760977), (-2.9289321881, -34.8468082858), (-10, -31.9178760977))
            Line((-10, -31.9178760977), (0, -31.9178760977))
            Line((0, -31.9178760977), (0, -41.9178760977))
        make_face()
    extrude(amount=F4_T123_DEPTH)

    split(bisect_by=Plane(origin=(18.7608568547, 0, 25.8221041874), x_dir=(0, 1, 0), z_dir=(0.5877852523, 0, 0.8090169944)), keep=Keep.TOP)


with BuildPart() as f4_tool117_1:
    add(f4_tool117.part)

    # F4_t125: intersect F4_tool121
    add(f4_tool121.part, mode=Mode.INTERSECT)


with BuildPart() as f1_19:
    add(f1_18.part)

    # F4_t115: cut F4_tool117
    add(f4_tool117_1.part, mode=Mode.SUBTRACT)


with BuildPart() as f4_tool128:
    # F4_s129 → F4_t130 (new body)
    with BuildSketch(Plane(origin=(38.9862817141, 0, -28.3251916741), x_dir=(0, 1, 0), z_dir=(-0.8090169944, 0, 0.5877852523))):
        with BuildLine():
            ThreePointArc((0, -41.9178760977), (-2.9289321881, -34.8468082858), (-10, -31.9178760977))
            Line((-10, -31.9178760977), (0, -31.9178760977))
            Line((0, -31.9178760977), (0, -41.9178760977))
        make_face()
    extrude(amount=F4_T130_DEPTH)

    split(bisect_by=Plane(origin=(-18.7608568547, 0, 25.8221041874), x_dir=(0, 1, 0), z_dir=(-0.5877852523, 0, 0.8090169944)), keep=Keep.TOP)


with BuildPart() as f4_tool132:
    # F4_s133 → F4_t134 (new body)
    with BuildSketch(Plane(origin=(38.9862817141, 0, 28.3251916741), x_dir=(0, 1, 0), z_dir=(-0.8090169944, 0, -0.5877852523))):
        with BuildLine():
            ThreePointArc((0, -41.9178760977), (-2.9289321881, -34.8468082858), (-10, -31.9178760977))
            Line((-10, -31.9178760977), (0, -31.9178760977))
            Line((0, -31.9178760977), (0, -41.9178760977))
        make_face()
    extrude(amount=F4_T134_DEPTH)

    split(bisect_by=Plane(origin=(18.7608568547, 0, 25.8221041874), x_dir=(0, 1, 0), z_dir=(0.5877852523, 0, 0.8090169944)), keep=Keep.TOP)


with BuildPart() as f4_tool128_1:
    add(f4_tool128.part)

    # F4_t136: intersect F4_tool132
    add(f4_tool132.part, mode=Mode.INTERSECT)


with BuildPart() as f1_20:
    add(f1_19.part)

    # F4_t126: cut F4_tool128
    add(f4_tool128_1.part, mode=Mode.SUBTRACT)


with BuildPart() as f4_tool139:
    # F4_s140 → F4_t141 (new body)
    with BuildSketch(Plane(origin=(38.9862817141, 0, 28.3251916741), x_dir=(0, 1, 0), z_dir=(-0.8090169944, 0, -0.5877852523))):
        with BuildLine():
            ThreePointArc((0, -41.9178760977), (-2.9289321881, -34.8468082858), (-10, -31.9178760977))
            Line((-10, -31.9178760977), (0, -31.9178760977))
            Line((0, -31.9178760977), (0, -41.9178760977))
        make_face()
    extrude(amount=F4_T141_DEPTH)

    split(bisect_by=Plane(origin=(-30.355704049, 0, -9.8631661385), x_dir=(0, 1, 0), z_dir=(-0.9510565163, 0, -0.3090169944)), keep=Keep.TOP)


with BuildPart() as f4_tool143:
    # F4_s144 → F4_t145 (new body)
    with BuildSketch(Plane(origin=(-14.8914345198, 0, 45.8311228665), x_dir=(0, 1, 0), z_dir=(0.3090169944, 0, -0.9510565163))):
        with BuildLine():
            ThreePointArc((0, -41.9178760977), (-2.9289321881, -34.8468082858), (-10, -31.9178760977))
            Line((-10, -31.9178760977), (0, -31.9178760977))
            Line((0, -31.9178760977), (0, -41.9178760977))
        make_face()
    extrude(amount=F4_T145_DEPTH)

    split(bisect_by=Plane(origin=(-18.7608568547, 0, 25.8221041874), x_dir=(0, 1, 0), z_dir=(-0.5877852523, 0, 0.8090169944)), keep=Keep.TOP)


with BuildPart() as f4_tool139_1:
    add(f4_tool139.part)

    # F4_t147: intersect F4_tool143
    add(f4_tool143.part, mode=Mode.INTERSECT)


with BuildPart() as f1_21:
    add(f1_20.part)

    # F4_t137: cut F4_tool139
    add(f4_tool139_1.part, mode=Mode.SUBTRACT)


with BuildPart() as f4_tool150:
    # F4_s151 → F4_t152 (new body)
    with BuildSketch(Plane(origin=(-14.8914345198, 0, 45.8311228665), x_dir=(0, 1, 0), z_dir=(0.3090169944, 0, -0.9510565163))):
        with BuildLine():
            ThreePointArc((0, -41.9178760977), (-2.9289321881, -34.8468082858), (-10, -31.9178760977))
            Line((-10, -31.9178760977), (0, -31.9178760977))
            Line((0, -31.9178760977), (0, -41.9178760977))
        make_face()
    extrude(amount=F4_T152_DEPTH)

    split(bisect_by=Plane.XY.offset(-31.9178760977), keep=Keep.BOTTOM)


with BuildPart() as f4_tool154:
    # F4_s155 → F4_t156 (new body)
    with BuildSketch(Plane.YZ.offset(-48.1896943886)):
        with BuildLine():
            ThreePointArc((0, -41.9178760977), (-2.9289321881, -34.8468082858), (-10, -31.9178760977))
            Line((-10, -31.9178760977), (0, -31.9178760977))
            Line((0, -31.9178760977), (0, -41.9178760977))
        make_face()
    extrude(amount=F4_T156_DEPTH)

    split(bisect_by=Plane(origin=(-30.355704049, 0, -9.8631661385), x_dir=(0, 1, 0), z_dir=(-0.9510565163, 0, -0.3090169944)), keep=Keep.TOP)


with BuildPart() as f4_tool150_1:
    add(f4_tool150.part)

    # F4_t158: intersect F4_tool154
    add(f4_tool154.part, mode=Mode.INTERSECT)


with BuildPart() as f1_22:
    add(f1_21.part)

    # F4_t148: cut F4_tool150
    add(f4_tool150_1.part, mode=Mode.SUBTRACT)


with BuildPart() as f4_tool161:
    # F4_s162 → F4_t163 (new body)
    with BuildSketch(Plane.YZ.offset(-48.1896943886)):
        with BuildLine():
            ThreePointArc((0, -41.9178760977), (-2.9289321881, -34.8468082858), (-10, -31.9178760977))
            Line((-10, -31.9178760977), (0, -31.9178760977))
            Line((0, -31.9178760977), (0, -41.9178760977))
        make_face()
    extrude(amount=F4_T163_DEPTH)

    split(bisect_by=Plane(origin=(30.355704049, 0, -9.8631661385), x_dir=(0, 1, 0), z_dir=(0.9510565163, 0, -0.3090169944)), keep=Keep.TOP)


with BuildPart() as f4_tool165:
    # F4_s166 → F4_t167 (new body)
    with BuildSketch(Plane(origin=(-14.8914345198, 0, -45.8311228665), x_dir=(0, 1, 0), z_dir=(0.3090169944, 0, 0.9510565163))):
        with BuildLine():
            ThreePointArc((0, -41.9178760977), (-2.9289321881, -34.8468082858), (-10, -31.9178760977))
            Line((-10, -31.9178760977), (0, -31.9178760977))
            Line((0, -31.9178760977), (0, -41.9178760977))
        make_face()
    extrude(amount=F4_T167_DEPTH)

    split(bisect_by=Plane.XY.offset(-31.9178760977), keep=Keep.BOTTOM)


with BuildPart() as f4_tool161_1:
    add(f4_tool161.part)

    # F4_t169: intersect F4_tool165
    add(f4_tool165.part, mode=Mode.INTERSECT)


with BuildPart() as f1_23:
    add(f1_22.part)

    # F4_t159: cut F4_tool161
    add(f4_tool161_1.part, mode=Mode.SUBTRACT)


with BuildPart() as f4_tool172:
    # F4_s173 → F4_t174 (new body)
    with BuildSketch(Plane(origin=(38.9862817141, 0, -28.3251916741), x_dir=(0, 1, 0), z_dir=(-0.8090169944, 0, 0.5877852523))):
        with BuildLine():
            ThreePointArc((-100, -41.9178760977), (-97.0710678119, -34.8468082858), (-90, -31.9178760977))
            Line((-90, -31.9178760977), (-100, -31.9178760977))
            Line((-100, -31.9178760977), (-100, -41.9178760977))
        make_face()
    extrude(amount=F4_T174_DEPTH)

    split(bisect_by=Plane(origin=(30.355704049, 0, -9.8631661385), x_dir=(0, 1, 0), z_dir=(0.9510565163, 0, -0.3090169944)), keep=Keep.TOP)


with BuildPart() as f4_tool176:
    # F4_s177 → F4_t178 (new body)
    with BuildSketch(Plane(origin=(-14.8914345198, 0, -45.8311228665), x_dir=(0, 1, 0), z_dir=(0.3090169944, 0, 0.9510565163))):
        with BuildLine():
            ThreePointArc((-100, -41.9178760977), (-97.0710678119, -34.8468082858), (-90, -31.9178760977))
            Line((-90, -31.9178760977), (-100, -31.9178760977))
            Line((-100, -31.9178760977), (-100, -41.9178760977))
        make_face()
    extrude(amount=F4_T178_DEPTH)

    split(bisect_by=Plane(origin=(18.7608568547, 0, 25.8221041874), x_dir=(0, 1, 0), z_dir=(0.5877852523, 0, 0.8090169944)), keep=Keep.TOP)


with BuildPart() as f4_tool172_1:
    add(f4_tool172.part)

    # F4_t180: intersect F4_tool176
    add(f4_tool176.part, mode=Mode.INTERSECT)


with BuildPart() as f1_24:
    add(f1_23.part)

    # F4_t170: cut F4_tool172
    add(f4_tool172_1.part, mode=Mode.SUBTRACT)


with BuildPart() as f4_tool183:
    # F4_s184 → F4_t185 (new body)
    with BuildSketch(Plane(origin=(38.9862817141, 0, -28.3251916741), x_dir=(0, 1, 0), z_dir=(-0.8090169944, 0, 0.5877852523))):
        with BuildLine():
            ThreePointArc((-100, -41.9178760977), (-97.0710678119, -34.8468082858), (-90, -31.9178760977))
            Line((-90, -31.9178760977), (-100, -31.9178760977))
            Line((-100, -31.9178760977), (-100, -41.9178760977))
        make_face()
    extrude(amount=F4_T185_DEPTH)

    split(bisect_by=Plane(origin=(-18.7608568547, 0, 25.8221041874), x_dir=(0, 1, 0), z_dir=(-0.5877852523, 0, 0.8090169944)), keep=Keep.TOP)


with BuildPart() as f4_tool187:
    # F4_s188 → F4_t189 (new body)
    with BuildSketch(Plane(origin=(38.9862817141, 0, 28.3251916741), x_dir=(0, 1, 0), z_dir=(-0.8090169944, 0, -0.5877852523))):
        with BuildLine():
            ThreePointArc((-100, -41.9178760977), (-97.0710678119, -34.8468082858), (-90, -31.9178760977))
            Line((-90, -31.9178760977), (-100, -31.9178760977))
            Line((-100, -31.9178760977), (-100, -41.9178760977))
        make_face()
    extrude(amount=F4_T189_DEPTH)

    split(bisect_by=Plane(origin=(18.7608568547, 0, 25.8221041874), x_dir=(0, 1, 0), z_dir=(0.5877852523, 0, 0.8090169944)), keep=Keep.TOP)


with BuildPart() as f4_tool183_1:
    add(f4_tool183.part)

    # F4_t191: intersect F4_tool187
    add(f4_tool187.part, mode=Mode.INTERSECT)


with BuildPart() as f1_25:
    add(f1_24.part)

    # F4_t181: cut F4_tool183
    add(f4_tool183_1.part, mode=Mode.SUBTRACT)


with BuildPart() as f4_tool194:
    # F4_s195 → F4_t196 (new body)
    with BuildSketch(Plane(origin=(38.9862817141, 0, 28.3251916741), x_dir=(0, 1, 0), z_dir=(-0.8090169944, 0, -0.5877852523))):
        with BuildLine():
            ThreePointArc((-100, -41.9178760977), (-97.0710678119, -34.8468082858), (-90, -31.9178760977))
            Line((-90, -31.9178760977), (-100, -31.9178760977))
            Line((-100, -31.9178760977), (-100, -41.9178760977))
        make_face()
    extrude(amount=F4_T196_DEPTH)

    split(bisect_by=Plane(origin=(-30.355704049, 0, -9.8631661385), x_dir=(0, 1, 0), z_dir=(-0.9510565163, 0, -0.3090169944)), keep=Keep.TOP)


with BuildPart() as f4_tool198:
    # F4_s199 → F4_t200 (new body)
    with BuildSketch(Plane(origin=(-14.8914345198, 0, 45.8311228665), x_dir=(0, 1, 0), z_dir=(0.3090169944, 0, -0.9510565163))):
        with BuildLine():
            ThreePointArc((-100, -41.9178760977), (-97.0710678119, -34.8468082858), (-90, -31.9178760977))
            Line((-90, -31.9178760977), (-100, -31.9178760977))
            Line((-100, -31.9178760977), (-100, -41.9178760977))
        make_face()
    extrude(amount=F4_T200_DEPTH)

    split(bisect_by=Plane(origin=(-18.7608568547, 0, 25.8221041874), x_dir=(0, 1, 0), z_dir=(-0.5877852523, 0, 0.8090169944)), keep=Keep.TOP)


with BuildPart() as f4_tool194_1:
    add(f4_tool194.part)

    # F4_t202: intersect F4_tool198
    add(f4_tool198.part, mode=Mode.INTERSECT)


with BuildPart() as f1_26:
    add(f1_25.part)

    # F4_t192: cut F4_tool194
    add(f4_tool194_1.part, mode=Mode.SUBTRACT)


with BuildPart() as f4_tool205:
    # F4_s206 → F4_t207 (new body)
    with BuildSketch(Plane(origin=(-14.8914345198, 0, 45.8311228665), x_dir=(0, 1, 0), z_dir=(0.3090169944, 0, -0.9510565163))):
        with BuildLine():
            ThreePointArc((-100, -41.9178760977), (-97.0710678119, -34.8468082858), (-90, -31.9178760977))
            Line((-90, -31.9178760977), (-100, -31.9178760977))
            Line((-100, -31.9178760977), (-100, -41.9178760977))
        make_face()
    extrude(amount=F4_T207_DEPTH)

    split(bisect_by=Plane.XY.offset(-31.9178760977), keep=Keep.BOTTOM)


with BuildPart() as f4_tool209:
    # F4_s210 → F4_t211 (new body)
    with BuildSketch(Plane.YZ.offset(-48.1896943886)):
        with BuildLine():
            ThreePointArc((-100, -41.9178760977), (-97.0710678119, -34.8468082858), (-90, -31.9178760977))
            Line((-90, -31.9178760977), (-100, -31.9178760977))
            Line((-100, -31.9178760977), (-100, -41.9178760977))
        make_face()
    extrude(amount=F4_T211_DEPTH)

    split(bisect_by=Plane(origin=(-30.355704049, 0, -9.8631661385), x_dir=(0, 1, 0), z_dir=(-0.9510565163, 0, -0.3090169944)), keep=Keep.TOP)


with BuildPart() as f4_tool205_1:
    add(f4_tool205.part)

    # F4_t213: intersect F4_tool209
    add(f4_tool209.part, mode=Mode.INTERSECT)


with BuildPart() as f1_27:
    add(f1_26.part)

    # F4_t203: cut F4_tool205
    add(f4_tool205_1.part, mode=Mode.SUBTRACT)


with BuildPart() as f4_tool216:
    # F4_s217 → F4_t218 (new body)
    with BuildSketch(Plane.YZ.offset(-48.1896943886)):
        with BuildLine():
            ThreePointArc((-100, -41.9178760977), (-97.0710678119, -34.8468082858), (-90, -31.9178760977))
            Line((-90, -31.9178760977), (-100, -31.9178760977))
            Line((-100, -31.9178760977), (-100, -41.9178760977))
        make_face()
    extrude(amount=F4_T218_DEPTH)

    split(bisect_by=Plane(origin=(30.355704049, 0, -9.8631661385), x_dir=(0, 1, 0), z_dir=(0.9510565163, 0, -0.3090169944)), keep=Keep.TOP)


with BuildPart() as f4_tool220:
    # F4_s221 → F4_t222 (new body)
    with BuildSketch(Plane(origin=(-14.8914345198, 0, -45.8311228665), x_dir=(0, 1, 0), z_dir=(0.3090169944, 0, 0.9510565163))):
        with BuildLine():
            ThreePointArc((-100, -41.9178760977), (-97.0710678119, -34.8468082858), (-90, -31.9178760977))
            Line((-90, -31.9178760977), (-100, -31.9178760977))
            Line((-100, -31.9178760977), (-100, -41.9178760977))
        make_face()
    extrude(amount=F4_T222_DEPTH)

    split(bisect_by=Plane.XY.offset(-31.9178760977), keep=Keep.BOTTOM)


with BuildPart() as f4_tool216_1:
    add(f4_tool216.part)

    # F4_t224: intersect F4_tool220
    add(f4_tool220.part, mode=Mode.INTERSECT)


with BuildPart() as f1_28:
    add(f1_27.part)

    # F4_t214: cut F4_tool216
    add(f4_tool216_1.part, mode=Mode.SUBTRACT)


solid = f1_28.part
